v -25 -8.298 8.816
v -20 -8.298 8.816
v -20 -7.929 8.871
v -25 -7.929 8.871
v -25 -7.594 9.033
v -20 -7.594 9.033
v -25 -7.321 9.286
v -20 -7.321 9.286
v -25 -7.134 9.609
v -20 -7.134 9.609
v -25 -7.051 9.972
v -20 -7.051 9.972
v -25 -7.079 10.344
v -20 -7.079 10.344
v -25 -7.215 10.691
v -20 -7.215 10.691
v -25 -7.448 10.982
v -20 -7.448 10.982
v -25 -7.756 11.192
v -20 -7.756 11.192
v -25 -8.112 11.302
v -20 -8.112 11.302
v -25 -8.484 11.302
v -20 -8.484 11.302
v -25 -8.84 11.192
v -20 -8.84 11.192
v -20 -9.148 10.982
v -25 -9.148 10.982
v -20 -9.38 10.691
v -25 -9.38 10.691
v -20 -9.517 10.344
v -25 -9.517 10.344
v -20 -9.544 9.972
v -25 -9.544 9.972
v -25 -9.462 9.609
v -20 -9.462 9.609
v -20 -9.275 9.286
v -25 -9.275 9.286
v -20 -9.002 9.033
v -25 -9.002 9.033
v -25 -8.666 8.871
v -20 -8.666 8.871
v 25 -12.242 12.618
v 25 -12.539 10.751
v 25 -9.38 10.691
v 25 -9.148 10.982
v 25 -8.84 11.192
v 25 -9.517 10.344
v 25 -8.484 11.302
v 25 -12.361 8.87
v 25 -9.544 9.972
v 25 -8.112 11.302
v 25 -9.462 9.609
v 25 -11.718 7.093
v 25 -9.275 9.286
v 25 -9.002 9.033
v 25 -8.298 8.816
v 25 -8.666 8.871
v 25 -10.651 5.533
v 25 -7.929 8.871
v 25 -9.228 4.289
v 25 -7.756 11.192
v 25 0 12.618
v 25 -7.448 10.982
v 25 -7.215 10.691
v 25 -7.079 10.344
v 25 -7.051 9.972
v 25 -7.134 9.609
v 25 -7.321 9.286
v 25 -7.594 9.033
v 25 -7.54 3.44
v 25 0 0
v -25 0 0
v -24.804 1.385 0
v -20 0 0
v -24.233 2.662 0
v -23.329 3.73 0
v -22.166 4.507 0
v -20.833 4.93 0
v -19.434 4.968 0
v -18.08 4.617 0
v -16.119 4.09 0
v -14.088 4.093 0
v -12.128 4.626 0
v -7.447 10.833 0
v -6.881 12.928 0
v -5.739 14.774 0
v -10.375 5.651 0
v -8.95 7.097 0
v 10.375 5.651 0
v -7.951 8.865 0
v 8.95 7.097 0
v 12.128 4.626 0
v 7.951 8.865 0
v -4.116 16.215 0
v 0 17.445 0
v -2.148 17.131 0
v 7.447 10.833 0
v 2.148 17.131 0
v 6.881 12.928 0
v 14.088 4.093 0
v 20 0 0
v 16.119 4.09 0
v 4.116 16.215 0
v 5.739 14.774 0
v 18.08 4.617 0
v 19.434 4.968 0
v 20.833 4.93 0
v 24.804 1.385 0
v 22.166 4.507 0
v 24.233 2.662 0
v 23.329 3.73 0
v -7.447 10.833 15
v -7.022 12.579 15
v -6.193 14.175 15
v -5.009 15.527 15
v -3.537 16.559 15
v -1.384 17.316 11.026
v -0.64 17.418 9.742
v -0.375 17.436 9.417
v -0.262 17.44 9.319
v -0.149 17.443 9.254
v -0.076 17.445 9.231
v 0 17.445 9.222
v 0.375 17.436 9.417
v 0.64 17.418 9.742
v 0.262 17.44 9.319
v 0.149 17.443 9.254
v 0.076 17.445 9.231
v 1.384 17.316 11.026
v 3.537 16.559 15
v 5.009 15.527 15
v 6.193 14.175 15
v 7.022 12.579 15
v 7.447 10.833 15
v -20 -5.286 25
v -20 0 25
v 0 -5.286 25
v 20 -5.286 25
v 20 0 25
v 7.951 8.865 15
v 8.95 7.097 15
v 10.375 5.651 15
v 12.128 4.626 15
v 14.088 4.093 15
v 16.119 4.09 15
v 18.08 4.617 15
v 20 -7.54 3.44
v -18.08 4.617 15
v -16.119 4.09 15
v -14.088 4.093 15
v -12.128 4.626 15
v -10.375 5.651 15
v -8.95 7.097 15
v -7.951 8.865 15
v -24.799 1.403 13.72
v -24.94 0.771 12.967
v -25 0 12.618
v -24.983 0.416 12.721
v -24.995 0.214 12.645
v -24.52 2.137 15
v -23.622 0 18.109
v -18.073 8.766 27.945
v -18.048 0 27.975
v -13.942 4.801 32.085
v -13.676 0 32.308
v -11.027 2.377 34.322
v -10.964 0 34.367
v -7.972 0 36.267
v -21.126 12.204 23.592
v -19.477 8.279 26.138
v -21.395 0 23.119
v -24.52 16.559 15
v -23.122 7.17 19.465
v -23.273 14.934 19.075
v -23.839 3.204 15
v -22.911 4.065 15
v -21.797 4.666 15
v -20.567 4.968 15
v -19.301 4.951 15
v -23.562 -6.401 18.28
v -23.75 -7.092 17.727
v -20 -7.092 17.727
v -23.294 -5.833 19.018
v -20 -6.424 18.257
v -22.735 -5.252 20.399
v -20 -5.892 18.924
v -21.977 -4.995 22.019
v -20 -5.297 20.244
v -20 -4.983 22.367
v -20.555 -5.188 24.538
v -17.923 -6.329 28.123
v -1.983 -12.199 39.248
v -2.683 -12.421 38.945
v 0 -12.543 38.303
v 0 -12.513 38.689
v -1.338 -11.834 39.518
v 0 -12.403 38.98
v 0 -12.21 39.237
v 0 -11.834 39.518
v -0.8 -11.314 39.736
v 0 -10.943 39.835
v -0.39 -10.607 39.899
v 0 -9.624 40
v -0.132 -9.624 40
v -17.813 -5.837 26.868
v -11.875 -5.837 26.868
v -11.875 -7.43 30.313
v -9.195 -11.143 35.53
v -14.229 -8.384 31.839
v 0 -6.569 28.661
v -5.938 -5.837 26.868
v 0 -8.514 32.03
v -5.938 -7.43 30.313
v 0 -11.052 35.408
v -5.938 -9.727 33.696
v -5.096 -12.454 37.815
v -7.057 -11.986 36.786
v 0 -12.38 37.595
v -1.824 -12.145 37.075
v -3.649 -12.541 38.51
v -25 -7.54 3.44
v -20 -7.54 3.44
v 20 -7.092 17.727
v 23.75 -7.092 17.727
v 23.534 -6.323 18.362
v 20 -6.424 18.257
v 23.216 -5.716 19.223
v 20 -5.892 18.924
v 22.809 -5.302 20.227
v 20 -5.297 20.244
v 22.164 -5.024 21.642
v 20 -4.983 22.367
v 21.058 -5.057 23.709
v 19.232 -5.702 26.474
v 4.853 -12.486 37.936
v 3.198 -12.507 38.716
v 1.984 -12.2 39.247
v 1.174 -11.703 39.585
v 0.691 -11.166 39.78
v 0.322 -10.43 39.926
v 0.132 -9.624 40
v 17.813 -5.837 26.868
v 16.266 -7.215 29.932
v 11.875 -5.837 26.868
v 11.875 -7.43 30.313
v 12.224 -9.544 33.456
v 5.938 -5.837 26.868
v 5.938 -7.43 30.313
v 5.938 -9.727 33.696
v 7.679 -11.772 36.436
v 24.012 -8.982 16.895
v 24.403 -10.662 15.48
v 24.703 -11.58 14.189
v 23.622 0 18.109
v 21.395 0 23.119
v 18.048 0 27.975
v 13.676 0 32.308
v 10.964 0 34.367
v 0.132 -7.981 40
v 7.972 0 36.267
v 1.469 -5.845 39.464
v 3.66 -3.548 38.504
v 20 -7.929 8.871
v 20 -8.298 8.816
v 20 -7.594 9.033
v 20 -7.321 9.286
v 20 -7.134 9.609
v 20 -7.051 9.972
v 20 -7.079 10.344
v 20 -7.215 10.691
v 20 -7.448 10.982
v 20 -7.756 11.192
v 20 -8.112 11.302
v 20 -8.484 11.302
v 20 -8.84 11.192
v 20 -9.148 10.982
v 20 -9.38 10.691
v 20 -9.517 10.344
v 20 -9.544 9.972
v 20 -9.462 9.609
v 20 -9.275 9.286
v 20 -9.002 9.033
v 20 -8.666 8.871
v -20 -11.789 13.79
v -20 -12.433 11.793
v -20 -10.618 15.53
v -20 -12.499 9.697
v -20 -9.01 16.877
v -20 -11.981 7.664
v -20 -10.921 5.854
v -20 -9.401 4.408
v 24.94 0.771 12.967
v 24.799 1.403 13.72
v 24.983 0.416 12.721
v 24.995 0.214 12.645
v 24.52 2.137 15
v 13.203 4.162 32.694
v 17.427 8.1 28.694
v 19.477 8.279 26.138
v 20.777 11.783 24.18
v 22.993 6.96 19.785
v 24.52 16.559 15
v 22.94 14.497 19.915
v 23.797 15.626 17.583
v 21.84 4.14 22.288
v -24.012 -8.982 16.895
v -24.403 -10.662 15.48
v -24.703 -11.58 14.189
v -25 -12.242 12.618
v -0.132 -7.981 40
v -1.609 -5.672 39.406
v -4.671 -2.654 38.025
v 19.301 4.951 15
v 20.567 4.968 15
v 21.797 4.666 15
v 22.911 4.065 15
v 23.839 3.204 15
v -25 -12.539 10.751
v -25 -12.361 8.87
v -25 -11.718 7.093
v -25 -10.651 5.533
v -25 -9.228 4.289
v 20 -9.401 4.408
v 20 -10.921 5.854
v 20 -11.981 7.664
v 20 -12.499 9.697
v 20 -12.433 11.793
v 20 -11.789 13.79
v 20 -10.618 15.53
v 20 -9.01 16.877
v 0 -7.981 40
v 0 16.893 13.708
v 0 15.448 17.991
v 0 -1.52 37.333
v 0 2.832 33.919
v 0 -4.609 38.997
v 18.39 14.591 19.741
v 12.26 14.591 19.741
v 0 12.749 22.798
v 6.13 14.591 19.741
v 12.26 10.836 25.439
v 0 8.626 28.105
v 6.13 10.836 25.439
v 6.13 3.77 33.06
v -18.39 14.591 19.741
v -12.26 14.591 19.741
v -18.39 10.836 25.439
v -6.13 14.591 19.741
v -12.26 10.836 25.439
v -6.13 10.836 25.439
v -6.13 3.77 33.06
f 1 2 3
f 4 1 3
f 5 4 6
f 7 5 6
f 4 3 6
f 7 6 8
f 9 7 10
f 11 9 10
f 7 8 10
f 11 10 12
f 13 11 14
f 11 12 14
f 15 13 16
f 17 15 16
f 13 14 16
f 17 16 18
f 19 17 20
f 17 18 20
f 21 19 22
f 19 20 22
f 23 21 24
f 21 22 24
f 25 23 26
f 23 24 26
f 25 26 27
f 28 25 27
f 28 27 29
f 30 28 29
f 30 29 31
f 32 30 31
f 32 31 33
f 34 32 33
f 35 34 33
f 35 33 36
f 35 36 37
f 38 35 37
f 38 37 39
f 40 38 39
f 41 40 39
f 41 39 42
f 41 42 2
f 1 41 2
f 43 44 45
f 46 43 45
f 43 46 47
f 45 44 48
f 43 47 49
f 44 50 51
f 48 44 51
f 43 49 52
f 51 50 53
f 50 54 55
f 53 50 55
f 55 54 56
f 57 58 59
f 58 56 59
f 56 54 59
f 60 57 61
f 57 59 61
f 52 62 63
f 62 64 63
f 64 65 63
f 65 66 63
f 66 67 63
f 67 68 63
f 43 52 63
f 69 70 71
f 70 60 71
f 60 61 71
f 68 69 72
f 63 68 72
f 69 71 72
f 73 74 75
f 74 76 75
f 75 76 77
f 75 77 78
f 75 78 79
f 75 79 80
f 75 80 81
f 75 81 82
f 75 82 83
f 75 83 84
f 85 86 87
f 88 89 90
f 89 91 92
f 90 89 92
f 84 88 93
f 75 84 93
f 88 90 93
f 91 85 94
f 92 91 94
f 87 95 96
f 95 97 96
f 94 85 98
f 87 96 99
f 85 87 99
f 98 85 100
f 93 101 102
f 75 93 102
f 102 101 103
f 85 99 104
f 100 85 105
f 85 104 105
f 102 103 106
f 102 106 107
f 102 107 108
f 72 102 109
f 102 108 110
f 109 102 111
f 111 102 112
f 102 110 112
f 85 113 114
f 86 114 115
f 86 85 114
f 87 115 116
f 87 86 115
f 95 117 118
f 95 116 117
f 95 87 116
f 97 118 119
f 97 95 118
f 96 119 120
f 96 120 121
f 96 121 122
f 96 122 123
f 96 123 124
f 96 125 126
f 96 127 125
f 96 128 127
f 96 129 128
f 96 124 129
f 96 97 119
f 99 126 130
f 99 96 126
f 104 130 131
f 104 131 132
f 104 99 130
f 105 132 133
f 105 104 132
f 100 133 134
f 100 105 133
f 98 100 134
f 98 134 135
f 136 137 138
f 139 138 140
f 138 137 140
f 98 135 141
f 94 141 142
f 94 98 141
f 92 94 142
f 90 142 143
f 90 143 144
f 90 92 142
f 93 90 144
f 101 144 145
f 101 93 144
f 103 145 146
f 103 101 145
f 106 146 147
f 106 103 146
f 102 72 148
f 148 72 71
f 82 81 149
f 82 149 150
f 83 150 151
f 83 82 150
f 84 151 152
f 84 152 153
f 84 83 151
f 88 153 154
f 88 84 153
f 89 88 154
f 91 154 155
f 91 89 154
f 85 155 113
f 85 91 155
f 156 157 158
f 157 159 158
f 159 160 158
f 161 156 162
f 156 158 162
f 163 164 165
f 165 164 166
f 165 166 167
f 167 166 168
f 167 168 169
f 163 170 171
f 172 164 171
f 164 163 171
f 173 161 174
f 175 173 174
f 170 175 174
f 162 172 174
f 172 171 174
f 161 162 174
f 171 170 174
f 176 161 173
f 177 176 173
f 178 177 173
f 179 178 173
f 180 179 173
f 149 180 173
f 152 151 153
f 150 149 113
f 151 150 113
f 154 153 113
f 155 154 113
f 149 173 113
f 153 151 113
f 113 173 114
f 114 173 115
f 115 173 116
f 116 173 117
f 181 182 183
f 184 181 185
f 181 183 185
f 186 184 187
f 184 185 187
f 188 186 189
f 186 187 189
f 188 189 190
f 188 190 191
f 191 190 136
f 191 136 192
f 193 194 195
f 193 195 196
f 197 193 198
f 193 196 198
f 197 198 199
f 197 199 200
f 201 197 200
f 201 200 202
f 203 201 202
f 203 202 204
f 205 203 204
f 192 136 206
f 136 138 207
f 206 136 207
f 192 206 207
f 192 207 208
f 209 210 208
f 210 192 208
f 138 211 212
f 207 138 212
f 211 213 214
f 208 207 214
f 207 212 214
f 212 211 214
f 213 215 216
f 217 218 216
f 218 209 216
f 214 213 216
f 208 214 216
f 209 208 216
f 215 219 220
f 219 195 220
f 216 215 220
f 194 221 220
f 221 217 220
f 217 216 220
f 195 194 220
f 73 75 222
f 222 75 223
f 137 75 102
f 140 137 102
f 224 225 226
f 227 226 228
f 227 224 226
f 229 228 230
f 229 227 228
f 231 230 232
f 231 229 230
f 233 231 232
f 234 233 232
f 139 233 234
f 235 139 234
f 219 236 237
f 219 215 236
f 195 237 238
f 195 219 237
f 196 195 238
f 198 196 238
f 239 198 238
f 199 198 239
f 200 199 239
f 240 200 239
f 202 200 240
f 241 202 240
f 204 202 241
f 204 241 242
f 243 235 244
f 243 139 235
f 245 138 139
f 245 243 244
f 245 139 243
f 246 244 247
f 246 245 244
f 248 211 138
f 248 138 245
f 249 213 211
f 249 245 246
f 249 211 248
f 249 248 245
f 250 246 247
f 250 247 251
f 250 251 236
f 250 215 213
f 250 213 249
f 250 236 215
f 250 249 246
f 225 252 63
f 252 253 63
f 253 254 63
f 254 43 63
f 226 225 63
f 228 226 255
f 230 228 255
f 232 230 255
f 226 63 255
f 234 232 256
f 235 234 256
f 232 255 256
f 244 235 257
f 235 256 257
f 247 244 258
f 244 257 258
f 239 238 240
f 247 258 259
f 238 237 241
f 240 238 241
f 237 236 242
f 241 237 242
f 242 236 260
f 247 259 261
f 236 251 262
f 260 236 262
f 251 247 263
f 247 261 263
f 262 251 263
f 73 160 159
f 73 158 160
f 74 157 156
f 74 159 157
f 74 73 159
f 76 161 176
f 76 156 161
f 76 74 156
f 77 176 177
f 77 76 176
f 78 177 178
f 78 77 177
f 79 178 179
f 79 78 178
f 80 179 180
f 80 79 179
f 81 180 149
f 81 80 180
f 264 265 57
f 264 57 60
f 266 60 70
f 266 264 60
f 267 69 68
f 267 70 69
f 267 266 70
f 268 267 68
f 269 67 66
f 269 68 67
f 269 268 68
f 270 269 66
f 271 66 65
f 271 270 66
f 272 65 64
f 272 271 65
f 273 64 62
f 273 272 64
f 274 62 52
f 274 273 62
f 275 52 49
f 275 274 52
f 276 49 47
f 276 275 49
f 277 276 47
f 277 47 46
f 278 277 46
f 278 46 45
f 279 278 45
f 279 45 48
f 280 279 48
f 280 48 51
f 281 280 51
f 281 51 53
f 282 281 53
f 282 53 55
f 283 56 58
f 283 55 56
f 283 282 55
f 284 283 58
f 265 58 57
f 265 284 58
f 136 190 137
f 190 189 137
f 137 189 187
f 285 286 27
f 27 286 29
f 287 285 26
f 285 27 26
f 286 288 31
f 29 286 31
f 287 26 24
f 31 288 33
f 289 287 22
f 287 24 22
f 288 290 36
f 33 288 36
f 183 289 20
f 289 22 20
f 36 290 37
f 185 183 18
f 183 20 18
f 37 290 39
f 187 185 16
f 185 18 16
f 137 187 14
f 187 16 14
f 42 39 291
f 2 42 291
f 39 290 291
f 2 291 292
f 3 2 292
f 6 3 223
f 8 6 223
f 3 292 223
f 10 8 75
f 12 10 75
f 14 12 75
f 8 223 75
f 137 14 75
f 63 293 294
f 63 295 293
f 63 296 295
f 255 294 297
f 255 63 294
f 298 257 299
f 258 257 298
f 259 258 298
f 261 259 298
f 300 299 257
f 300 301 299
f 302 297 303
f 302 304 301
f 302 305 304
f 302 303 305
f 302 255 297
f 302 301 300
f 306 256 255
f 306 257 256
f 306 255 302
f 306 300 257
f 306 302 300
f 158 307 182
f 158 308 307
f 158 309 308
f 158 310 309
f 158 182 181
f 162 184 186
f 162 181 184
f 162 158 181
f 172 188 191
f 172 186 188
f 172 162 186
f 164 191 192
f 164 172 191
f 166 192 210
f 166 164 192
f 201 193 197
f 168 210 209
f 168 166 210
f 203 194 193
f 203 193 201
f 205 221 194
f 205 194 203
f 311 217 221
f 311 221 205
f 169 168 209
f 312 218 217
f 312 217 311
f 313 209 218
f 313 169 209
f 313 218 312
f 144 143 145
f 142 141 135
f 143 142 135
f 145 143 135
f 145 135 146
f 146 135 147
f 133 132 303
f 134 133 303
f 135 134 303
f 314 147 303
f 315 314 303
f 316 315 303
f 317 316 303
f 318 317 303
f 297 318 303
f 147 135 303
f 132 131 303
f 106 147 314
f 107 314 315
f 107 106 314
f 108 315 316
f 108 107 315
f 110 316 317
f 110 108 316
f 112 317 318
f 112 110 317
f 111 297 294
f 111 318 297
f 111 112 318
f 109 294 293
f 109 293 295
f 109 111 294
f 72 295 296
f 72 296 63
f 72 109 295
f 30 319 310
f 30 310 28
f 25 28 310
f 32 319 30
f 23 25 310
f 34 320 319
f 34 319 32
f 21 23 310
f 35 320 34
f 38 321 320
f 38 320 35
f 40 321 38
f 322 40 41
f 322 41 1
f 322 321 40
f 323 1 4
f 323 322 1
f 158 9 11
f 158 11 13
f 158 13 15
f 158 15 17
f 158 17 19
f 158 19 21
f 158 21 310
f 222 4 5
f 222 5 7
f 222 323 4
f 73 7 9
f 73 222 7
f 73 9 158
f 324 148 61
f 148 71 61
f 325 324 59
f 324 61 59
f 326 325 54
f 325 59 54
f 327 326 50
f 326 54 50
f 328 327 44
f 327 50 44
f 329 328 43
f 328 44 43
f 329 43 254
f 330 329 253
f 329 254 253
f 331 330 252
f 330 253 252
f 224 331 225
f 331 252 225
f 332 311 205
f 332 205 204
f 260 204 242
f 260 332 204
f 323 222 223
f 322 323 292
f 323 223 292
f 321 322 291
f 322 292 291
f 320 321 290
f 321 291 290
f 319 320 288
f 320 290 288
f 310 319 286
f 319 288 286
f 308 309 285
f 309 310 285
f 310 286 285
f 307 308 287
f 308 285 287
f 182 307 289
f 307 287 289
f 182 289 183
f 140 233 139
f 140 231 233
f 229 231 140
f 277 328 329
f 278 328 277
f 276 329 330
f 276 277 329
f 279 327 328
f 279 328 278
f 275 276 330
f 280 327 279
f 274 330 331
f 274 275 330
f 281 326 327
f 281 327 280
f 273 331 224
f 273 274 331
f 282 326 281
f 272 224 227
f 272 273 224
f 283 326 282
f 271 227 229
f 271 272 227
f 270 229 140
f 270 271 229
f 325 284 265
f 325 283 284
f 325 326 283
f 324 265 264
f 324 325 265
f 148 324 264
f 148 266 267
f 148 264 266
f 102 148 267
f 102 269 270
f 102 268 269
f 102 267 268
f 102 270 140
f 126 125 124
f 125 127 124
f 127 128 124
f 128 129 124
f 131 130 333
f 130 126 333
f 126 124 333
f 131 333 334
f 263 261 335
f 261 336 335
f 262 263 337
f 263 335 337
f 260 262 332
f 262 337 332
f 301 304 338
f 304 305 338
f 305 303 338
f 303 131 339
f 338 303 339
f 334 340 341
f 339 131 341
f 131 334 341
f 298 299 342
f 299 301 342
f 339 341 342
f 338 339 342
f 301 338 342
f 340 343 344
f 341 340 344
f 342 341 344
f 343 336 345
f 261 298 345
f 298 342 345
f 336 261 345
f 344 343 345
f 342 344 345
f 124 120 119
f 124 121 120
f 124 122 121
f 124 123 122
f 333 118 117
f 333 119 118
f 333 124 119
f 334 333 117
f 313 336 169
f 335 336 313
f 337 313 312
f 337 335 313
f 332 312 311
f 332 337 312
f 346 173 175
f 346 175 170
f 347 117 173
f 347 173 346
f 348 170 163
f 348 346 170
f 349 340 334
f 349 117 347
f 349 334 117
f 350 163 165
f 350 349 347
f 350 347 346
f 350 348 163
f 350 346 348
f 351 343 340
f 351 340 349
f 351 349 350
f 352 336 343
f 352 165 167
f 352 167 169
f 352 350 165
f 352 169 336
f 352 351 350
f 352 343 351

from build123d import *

# Parameters (mm, degrees)
SKETCH1_W                = 50
SKETCH1_H                = 35
BOSS_EXTRUDE1_DEPTH      = 40
CUT_EXTRUDE3_DEPTH       = 15
CUT_EXTRUDE6_DEPTH       = 51.311529494
CUT_EXTRUDE6_DEPTH_BACK  = 51.311529494
CUT_EXTRUDE8_DEPTH       = 51.292408862
CUT_EXTRUDE8_DEPTH_BACK  = 51.292408862
SKETCH6_W                = 40
SKETCH6_H                = 12.54309885
CUT_EXTRUDE9_DEPTH       = 25
SKETCH7_R                = 1.25
CUT_EXTRUDE10_DEPTH      = 51.292408862
CUT_EXTRUDE10_DEPTH_BACK = 51.292408862


with BuildPart() as part:
    # Sketch1 → Boss-Extrude1 (new body)
    with BuildSketch(Plane.XY):
        Rectangle(SKETCH1_W, SKETCH1_H)
    extrude(amount=BOSS_EXTRUDE1_DEPTH)

    # Sketch3 → Cut-Extrude3 (cut)
    with BuildSketch(Plane.XY):
        with BuildLine():
            ThreePointArc((18.080023646, 4.616675297), (22.774898037, 4.159319762), (25, 0))
            Line((25, 0), (25, 17.5))
            Line((25, 17.5), (20.265083079, 17.5))
            ThreePointArc((20.265083079, 17.5), (22.164558634, 14.89755515), (22.836723839, 11.746536186))
            ThreePointArc((22.836723839, 11.746536186), (21.538401387, 7.461063254), (18.080023646, 4.616675297))
        make_face()
        with BuildLine():
            ThreePointArc((9.964651512, 17.5), (7.890776302, 14.474095131), (7.447285057, 10.832615462))
            ThreePointArc((7.447285057, 10.832615462), (11.217729841, 5.080248753), (18.080023646, 4.616675297))
            ThreePointArc((18.080023646, 4.616675297), (21.538401387, 7.461063254), (22.836723839, 11.746536186))
            ThreePointArc((22.836723839, 11.746536186), (22.164558634, 14.89755515), (20.265083079, 17.5))
            Line((20.265083079, 17.5), (9.964651512, 17.5))
        make_face()
        with BuildLine():
            ThreePointArc((20.265083079, 17.5), (15.114867296, 19.46839273), (9.964651512, 17.5))
            Line((9.964651512, 17.5), (20.265083079, 17.5))
        make_face()
        with BuildLine():
            ThreePointArc((-7.393010752, 11.746536186), (-7.406591271, 11.28877073), (-7.447285061, 10.832615429))
            ThreePointArc((-7.447285061, 10.832615429), (-1.7e-08, 17.444952642), (7.447285057, 10.832615462))
            ThreePointArc((7.447285057, 10.832615462), (7.890776302, 14.474095131), (9.964651512, 17.5))
            Line((9.964651512, 17.5), (-9.964651512, 17.5))
            ThreePointArc((-9.964651512, 17.5), (-8.065175957, 14.89755515), (-7.393010752, 11.746536186))
        make_face()
        with BuildLine():
            ThreePointArc((-20.265083079, 17.5), (-22.728002657, 10.455320307), (-18.080023619, 4.616675286))
            ThreePointArc((-18.080023619, 4.616675286), (-11.217729842, 5.080248753), (-7.447285061, 10.832615429))
            ThreePointArc((-7.447285061, 10.832615429), (-7.406591271, 11.28877073), (-7.393010752, 11.746536186))
            ThreePointArc((-7.393010752, 11.746536186), (-8.065175957, 14.89755515), (-9.964651512, 17.5))
            Line((-9.964651512, 17.5), (-20.265083079, 17.5))
        make_face()
        with BuildLine():
            ThreePointArc((-9.964651512, 17.5), (-15.114867296, 19.46839273), (-20.265083079, 17.5))
            Line((-20.265083079, 17.5), (-9.964651512, 17.5))
        make_face()
        with BuildLine():
            Line((-25, 17.5), (-25, 2.5e-08))
            ThreePointArc((-25, 2.5e-08), (-22.774898014, 4.159319778), (-18.080023619, 4.616675286))
            ThreePointArc((-18.080023619, 4.616675286), (-22.728002657, 10.455320307), (-20.265083079, 17.5))
            Line((-20.265083079, 17.5), (-25, 17.5))
        make_face()
    extrude(amount=CUT_EXTRUDE3_DEPTH, mode=Mode.SUBTRACT)

    # Sketch4 → Cut-Extrude6 (cut, two sides)
    with BuildSketch(Plane(origin=(0, 0, 0), x_dir=(0, 0, -1), z_dir=(1, 0, 0))) as cut_extrude6_sk:
        with BuildLine():
            add(Edge.make_bspline(
                [(-9.222271241, 17.444952642), (-10.649134008, 17.379362556), (-16.532124994, 16.800094175), (-24.99058992, 11.744877304), (-33.962260097, 3.205152878), (-39.211523546, -3.38022438), (-40, -7.980712731)],
                knots=[0.128951398, 0.128951398, 0.128951398, 0.128951398, 0.217673321, 0.497466286, 0.713557135, 1, 1, 1, 1], degree=3))
            Line((-9.222271241, 17.444952642), (-40, 17.444952642))
            Line((-40, 17.444952642), (-40, -7.980712731))
        make_face()
        with BuildLine():
            Line((0, 0), (-3.44001081, -7.539638425))
            ThreePointArc((-3.44001081, -7.539638425), (-10.74719823, -12.539419504), (-17.727021343, -7.091955125))
            add(Edge.make_bspline(
                [(-17.727021343, -7.091955125), (-18.502936425, -5.824551955), (-21.808604968, -4.479724911), (-27.869116221, -5.844724863), (-33.812288914, -9.39721757), (-39.72251086, -14.860797268), (-40, -9.623944384)],
                knots=[0.042605041, 0.042605041, 0.042605041, 0.042605041, 0.193253168, 0.379939411, 0.648785626, 0.970666237, 0.970666237, 0.970666237, 0.970666237], degree=3))
            Line((-40, -9.623944384), (-40, -17.5))
            Line((-40, -17.5), (0, -17.5))
            Line((0, -17.5), (0, 0))
        make_face()
    extrude(amount=CUT_EXTRUDE6_DEPTH, mode=Mode.SUBTRACT)
    extrude(cut_extrude6_sk.sketch, amount=-CUT_EXTRUDE6_DEPTH_BACK, mode=Mode.SUBTRACT)


with BuildPart() as cut_extrude6_kept_piece:
    # of the separate pieces the step leaves, the one the design keeps (cut_extrude6_pieces_kept)
    add(part.part.solids().sort_by_distance((-7.447285061, 10.832615429, 15))[0])

    # Sketch5 → Cut-Extrude8 (cut, two sides)
    with BuildSketch(Plane(origin=(0, 0, 0), x_dir=(1, 0, 0), z_dir=(0, 1, 0))) as cut_extrude8_sk:
        with BuildLine():
            add(Edge.make_bspline(
                [(-25, -12.617742903), (-21.837163113, -31.626777816), (0, -40.051194025)],
                knots=[0, 0, 0, 1, 1, 1], degree=2))
            Line((0, -40.051194025), (-25, -40))
            Line((-25, -40), (-25, -12.617742903))
        make_face()
        with BuildLine():
            Line((25, -40), (25, -12.617742903))
            add(Edge.make_bspline(
                [(25, -12.617742903), (21.837163113, -31.626777816), (0, -40.051194025)],
                knots=[0, 0, 0, 1, 1, 1], degree=2))
            Line((0, -40.051194025), (25, -40))
        make_face()
    extrude(amount=CUT_EXTRUDE8_DEPTH, mode=Mode.SUBTRACT)
    extrude(cut_extrude8_sk.sketch, amount=-CUT_EXTRUDE8_DEPTH_BACK, mode=Mode.SUBTRACT)

    # Sketch6 → Cut-Extrude9 (cut)
    with BuildSketch(Plane.XY):
        with Locations((0, -6.271549425)):
            Rectangle(SKETCH6_W, SKETCH6_H)
    extrude(amount=CUT_EXTRUDE9_DEPTH, mode=Mode.SUBTRACT)

    # Sketch7 → Cut-Extrude10 (cut, two sides)
    with BuildSketch(Plane(origin=(0, 0, 0), x_dir=(0, 0, -1), z_dir=(1, 0, 0))) as cut_extrude10_sk:
        with Locations((-10.065545273, -8.297943519)):
            Circle(SKETCH7_R)
    extrude(amount=CUT_EXTRUDE10_DEPTH, mode=Mode.SUBTRACT)
    extrude(cut_extrude10_sk.sketch, amount=-CUT_EXTRUDE10_DEPTH_BACK, mode=Mode.SUBTRACT)


solid = cut_extrude6_kept_piece.part
